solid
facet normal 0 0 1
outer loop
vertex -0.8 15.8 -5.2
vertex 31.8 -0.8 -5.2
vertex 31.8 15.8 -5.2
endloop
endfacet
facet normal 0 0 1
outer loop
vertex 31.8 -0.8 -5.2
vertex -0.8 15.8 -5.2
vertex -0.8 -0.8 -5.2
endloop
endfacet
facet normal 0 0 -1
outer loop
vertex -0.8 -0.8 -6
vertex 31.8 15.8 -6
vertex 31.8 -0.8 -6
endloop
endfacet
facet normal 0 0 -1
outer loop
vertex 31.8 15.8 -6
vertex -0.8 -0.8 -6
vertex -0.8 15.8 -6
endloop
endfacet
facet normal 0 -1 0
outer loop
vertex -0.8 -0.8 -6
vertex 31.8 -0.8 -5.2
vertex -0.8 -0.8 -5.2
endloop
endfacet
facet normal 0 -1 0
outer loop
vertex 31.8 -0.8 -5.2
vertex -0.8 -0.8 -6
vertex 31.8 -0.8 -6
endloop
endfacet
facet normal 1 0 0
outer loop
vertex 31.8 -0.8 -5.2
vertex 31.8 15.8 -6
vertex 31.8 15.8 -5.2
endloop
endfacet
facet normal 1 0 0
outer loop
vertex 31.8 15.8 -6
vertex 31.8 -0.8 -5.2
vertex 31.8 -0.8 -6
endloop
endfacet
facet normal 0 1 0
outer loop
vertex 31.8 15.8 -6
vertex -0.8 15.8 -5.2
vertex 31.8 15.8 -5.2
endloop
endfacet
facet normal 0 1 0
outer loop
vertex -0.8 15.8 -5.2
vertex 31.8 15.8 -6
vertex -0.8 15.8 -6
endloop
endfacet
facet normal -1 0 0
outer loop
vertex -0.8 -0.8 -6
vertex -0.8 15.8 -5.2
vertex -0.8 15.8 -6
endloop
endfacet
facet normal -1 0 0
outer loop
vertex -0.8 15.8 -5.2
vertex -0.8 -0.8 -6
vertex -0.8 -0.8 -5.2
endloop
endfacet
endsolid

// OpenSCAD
bluetooth_module_longth = 30+1;//长30mm
bluetooth_module_width = 15;//宽15mm
bluetooth_module_PCB_heigth  = 1.05;//PCB厚度1.05
chip1heigth = 2.64-1.05;
chip1longth = 5.03;
chip1width = 4.11 ;
chip2_heigth = 1.85-1.05;
chip2_longth = 3.98;

button_longth  =5.08;
button_longth2  =3.73;
button_Maxheight = 2.6-bluetooth_module_PCB_heigth;//释放按键时候的厚度
button_Minheight = 2.4-bluetooth_module_PCB_heigth;//按下按键的时候的厚度
button_baseheight = 2.33-bluetooth_module_PCB_heigth;//按键底座厚度
button_baseheight2 = 1.91-bluetooth_module_PCB_heigth;//按键底座厚度
hole1_r = 1.7/2;
hole1_distance_to_x =  1.8+hole1_r;
hole1_distance_to_y =  3.22+hole1_r;
hole2_r = 1.2/2;
hole2_distance_to_x =  12+hole2_r;
hole2_distance_to_y =  3.38+hole2_r;
hole3_r = 1.16/2;
hole3_distance_to_x =  26.48+hole3_r;
hole3_distance_to_y =  2+hole3_r;
hole4_r = 1.67/2;
hole4_distance_to_x =  26.2+hole4_r;
hole4_distance_to_y =  11.8+hole4_r;

btn_distance_to_y_border = 10.03-button_longth;
btn_distance_to_x_border = 9.55-button_longth;

battery_width  =5.2;
support_height = button_Maxheight+bluetooth_module_PCB_heigth+battery_width;

box_border_widht = 0.8;
            
            box_border_height = 0.8;
            // box_border_height = 2;
            box_border_zoffset = -support_height+button_Maxheight+bluetooth_module_PCB_heigth-box_border_widht;
            translate([-box_border_widht, -box_border_widht, box_border_zoffset]) 
            {
                cube(size=[bluetooth_module_longth+box_border_widht*2, bluetooth_module_width+box_border_widht*2, box_border_height]);//PCB
            }
